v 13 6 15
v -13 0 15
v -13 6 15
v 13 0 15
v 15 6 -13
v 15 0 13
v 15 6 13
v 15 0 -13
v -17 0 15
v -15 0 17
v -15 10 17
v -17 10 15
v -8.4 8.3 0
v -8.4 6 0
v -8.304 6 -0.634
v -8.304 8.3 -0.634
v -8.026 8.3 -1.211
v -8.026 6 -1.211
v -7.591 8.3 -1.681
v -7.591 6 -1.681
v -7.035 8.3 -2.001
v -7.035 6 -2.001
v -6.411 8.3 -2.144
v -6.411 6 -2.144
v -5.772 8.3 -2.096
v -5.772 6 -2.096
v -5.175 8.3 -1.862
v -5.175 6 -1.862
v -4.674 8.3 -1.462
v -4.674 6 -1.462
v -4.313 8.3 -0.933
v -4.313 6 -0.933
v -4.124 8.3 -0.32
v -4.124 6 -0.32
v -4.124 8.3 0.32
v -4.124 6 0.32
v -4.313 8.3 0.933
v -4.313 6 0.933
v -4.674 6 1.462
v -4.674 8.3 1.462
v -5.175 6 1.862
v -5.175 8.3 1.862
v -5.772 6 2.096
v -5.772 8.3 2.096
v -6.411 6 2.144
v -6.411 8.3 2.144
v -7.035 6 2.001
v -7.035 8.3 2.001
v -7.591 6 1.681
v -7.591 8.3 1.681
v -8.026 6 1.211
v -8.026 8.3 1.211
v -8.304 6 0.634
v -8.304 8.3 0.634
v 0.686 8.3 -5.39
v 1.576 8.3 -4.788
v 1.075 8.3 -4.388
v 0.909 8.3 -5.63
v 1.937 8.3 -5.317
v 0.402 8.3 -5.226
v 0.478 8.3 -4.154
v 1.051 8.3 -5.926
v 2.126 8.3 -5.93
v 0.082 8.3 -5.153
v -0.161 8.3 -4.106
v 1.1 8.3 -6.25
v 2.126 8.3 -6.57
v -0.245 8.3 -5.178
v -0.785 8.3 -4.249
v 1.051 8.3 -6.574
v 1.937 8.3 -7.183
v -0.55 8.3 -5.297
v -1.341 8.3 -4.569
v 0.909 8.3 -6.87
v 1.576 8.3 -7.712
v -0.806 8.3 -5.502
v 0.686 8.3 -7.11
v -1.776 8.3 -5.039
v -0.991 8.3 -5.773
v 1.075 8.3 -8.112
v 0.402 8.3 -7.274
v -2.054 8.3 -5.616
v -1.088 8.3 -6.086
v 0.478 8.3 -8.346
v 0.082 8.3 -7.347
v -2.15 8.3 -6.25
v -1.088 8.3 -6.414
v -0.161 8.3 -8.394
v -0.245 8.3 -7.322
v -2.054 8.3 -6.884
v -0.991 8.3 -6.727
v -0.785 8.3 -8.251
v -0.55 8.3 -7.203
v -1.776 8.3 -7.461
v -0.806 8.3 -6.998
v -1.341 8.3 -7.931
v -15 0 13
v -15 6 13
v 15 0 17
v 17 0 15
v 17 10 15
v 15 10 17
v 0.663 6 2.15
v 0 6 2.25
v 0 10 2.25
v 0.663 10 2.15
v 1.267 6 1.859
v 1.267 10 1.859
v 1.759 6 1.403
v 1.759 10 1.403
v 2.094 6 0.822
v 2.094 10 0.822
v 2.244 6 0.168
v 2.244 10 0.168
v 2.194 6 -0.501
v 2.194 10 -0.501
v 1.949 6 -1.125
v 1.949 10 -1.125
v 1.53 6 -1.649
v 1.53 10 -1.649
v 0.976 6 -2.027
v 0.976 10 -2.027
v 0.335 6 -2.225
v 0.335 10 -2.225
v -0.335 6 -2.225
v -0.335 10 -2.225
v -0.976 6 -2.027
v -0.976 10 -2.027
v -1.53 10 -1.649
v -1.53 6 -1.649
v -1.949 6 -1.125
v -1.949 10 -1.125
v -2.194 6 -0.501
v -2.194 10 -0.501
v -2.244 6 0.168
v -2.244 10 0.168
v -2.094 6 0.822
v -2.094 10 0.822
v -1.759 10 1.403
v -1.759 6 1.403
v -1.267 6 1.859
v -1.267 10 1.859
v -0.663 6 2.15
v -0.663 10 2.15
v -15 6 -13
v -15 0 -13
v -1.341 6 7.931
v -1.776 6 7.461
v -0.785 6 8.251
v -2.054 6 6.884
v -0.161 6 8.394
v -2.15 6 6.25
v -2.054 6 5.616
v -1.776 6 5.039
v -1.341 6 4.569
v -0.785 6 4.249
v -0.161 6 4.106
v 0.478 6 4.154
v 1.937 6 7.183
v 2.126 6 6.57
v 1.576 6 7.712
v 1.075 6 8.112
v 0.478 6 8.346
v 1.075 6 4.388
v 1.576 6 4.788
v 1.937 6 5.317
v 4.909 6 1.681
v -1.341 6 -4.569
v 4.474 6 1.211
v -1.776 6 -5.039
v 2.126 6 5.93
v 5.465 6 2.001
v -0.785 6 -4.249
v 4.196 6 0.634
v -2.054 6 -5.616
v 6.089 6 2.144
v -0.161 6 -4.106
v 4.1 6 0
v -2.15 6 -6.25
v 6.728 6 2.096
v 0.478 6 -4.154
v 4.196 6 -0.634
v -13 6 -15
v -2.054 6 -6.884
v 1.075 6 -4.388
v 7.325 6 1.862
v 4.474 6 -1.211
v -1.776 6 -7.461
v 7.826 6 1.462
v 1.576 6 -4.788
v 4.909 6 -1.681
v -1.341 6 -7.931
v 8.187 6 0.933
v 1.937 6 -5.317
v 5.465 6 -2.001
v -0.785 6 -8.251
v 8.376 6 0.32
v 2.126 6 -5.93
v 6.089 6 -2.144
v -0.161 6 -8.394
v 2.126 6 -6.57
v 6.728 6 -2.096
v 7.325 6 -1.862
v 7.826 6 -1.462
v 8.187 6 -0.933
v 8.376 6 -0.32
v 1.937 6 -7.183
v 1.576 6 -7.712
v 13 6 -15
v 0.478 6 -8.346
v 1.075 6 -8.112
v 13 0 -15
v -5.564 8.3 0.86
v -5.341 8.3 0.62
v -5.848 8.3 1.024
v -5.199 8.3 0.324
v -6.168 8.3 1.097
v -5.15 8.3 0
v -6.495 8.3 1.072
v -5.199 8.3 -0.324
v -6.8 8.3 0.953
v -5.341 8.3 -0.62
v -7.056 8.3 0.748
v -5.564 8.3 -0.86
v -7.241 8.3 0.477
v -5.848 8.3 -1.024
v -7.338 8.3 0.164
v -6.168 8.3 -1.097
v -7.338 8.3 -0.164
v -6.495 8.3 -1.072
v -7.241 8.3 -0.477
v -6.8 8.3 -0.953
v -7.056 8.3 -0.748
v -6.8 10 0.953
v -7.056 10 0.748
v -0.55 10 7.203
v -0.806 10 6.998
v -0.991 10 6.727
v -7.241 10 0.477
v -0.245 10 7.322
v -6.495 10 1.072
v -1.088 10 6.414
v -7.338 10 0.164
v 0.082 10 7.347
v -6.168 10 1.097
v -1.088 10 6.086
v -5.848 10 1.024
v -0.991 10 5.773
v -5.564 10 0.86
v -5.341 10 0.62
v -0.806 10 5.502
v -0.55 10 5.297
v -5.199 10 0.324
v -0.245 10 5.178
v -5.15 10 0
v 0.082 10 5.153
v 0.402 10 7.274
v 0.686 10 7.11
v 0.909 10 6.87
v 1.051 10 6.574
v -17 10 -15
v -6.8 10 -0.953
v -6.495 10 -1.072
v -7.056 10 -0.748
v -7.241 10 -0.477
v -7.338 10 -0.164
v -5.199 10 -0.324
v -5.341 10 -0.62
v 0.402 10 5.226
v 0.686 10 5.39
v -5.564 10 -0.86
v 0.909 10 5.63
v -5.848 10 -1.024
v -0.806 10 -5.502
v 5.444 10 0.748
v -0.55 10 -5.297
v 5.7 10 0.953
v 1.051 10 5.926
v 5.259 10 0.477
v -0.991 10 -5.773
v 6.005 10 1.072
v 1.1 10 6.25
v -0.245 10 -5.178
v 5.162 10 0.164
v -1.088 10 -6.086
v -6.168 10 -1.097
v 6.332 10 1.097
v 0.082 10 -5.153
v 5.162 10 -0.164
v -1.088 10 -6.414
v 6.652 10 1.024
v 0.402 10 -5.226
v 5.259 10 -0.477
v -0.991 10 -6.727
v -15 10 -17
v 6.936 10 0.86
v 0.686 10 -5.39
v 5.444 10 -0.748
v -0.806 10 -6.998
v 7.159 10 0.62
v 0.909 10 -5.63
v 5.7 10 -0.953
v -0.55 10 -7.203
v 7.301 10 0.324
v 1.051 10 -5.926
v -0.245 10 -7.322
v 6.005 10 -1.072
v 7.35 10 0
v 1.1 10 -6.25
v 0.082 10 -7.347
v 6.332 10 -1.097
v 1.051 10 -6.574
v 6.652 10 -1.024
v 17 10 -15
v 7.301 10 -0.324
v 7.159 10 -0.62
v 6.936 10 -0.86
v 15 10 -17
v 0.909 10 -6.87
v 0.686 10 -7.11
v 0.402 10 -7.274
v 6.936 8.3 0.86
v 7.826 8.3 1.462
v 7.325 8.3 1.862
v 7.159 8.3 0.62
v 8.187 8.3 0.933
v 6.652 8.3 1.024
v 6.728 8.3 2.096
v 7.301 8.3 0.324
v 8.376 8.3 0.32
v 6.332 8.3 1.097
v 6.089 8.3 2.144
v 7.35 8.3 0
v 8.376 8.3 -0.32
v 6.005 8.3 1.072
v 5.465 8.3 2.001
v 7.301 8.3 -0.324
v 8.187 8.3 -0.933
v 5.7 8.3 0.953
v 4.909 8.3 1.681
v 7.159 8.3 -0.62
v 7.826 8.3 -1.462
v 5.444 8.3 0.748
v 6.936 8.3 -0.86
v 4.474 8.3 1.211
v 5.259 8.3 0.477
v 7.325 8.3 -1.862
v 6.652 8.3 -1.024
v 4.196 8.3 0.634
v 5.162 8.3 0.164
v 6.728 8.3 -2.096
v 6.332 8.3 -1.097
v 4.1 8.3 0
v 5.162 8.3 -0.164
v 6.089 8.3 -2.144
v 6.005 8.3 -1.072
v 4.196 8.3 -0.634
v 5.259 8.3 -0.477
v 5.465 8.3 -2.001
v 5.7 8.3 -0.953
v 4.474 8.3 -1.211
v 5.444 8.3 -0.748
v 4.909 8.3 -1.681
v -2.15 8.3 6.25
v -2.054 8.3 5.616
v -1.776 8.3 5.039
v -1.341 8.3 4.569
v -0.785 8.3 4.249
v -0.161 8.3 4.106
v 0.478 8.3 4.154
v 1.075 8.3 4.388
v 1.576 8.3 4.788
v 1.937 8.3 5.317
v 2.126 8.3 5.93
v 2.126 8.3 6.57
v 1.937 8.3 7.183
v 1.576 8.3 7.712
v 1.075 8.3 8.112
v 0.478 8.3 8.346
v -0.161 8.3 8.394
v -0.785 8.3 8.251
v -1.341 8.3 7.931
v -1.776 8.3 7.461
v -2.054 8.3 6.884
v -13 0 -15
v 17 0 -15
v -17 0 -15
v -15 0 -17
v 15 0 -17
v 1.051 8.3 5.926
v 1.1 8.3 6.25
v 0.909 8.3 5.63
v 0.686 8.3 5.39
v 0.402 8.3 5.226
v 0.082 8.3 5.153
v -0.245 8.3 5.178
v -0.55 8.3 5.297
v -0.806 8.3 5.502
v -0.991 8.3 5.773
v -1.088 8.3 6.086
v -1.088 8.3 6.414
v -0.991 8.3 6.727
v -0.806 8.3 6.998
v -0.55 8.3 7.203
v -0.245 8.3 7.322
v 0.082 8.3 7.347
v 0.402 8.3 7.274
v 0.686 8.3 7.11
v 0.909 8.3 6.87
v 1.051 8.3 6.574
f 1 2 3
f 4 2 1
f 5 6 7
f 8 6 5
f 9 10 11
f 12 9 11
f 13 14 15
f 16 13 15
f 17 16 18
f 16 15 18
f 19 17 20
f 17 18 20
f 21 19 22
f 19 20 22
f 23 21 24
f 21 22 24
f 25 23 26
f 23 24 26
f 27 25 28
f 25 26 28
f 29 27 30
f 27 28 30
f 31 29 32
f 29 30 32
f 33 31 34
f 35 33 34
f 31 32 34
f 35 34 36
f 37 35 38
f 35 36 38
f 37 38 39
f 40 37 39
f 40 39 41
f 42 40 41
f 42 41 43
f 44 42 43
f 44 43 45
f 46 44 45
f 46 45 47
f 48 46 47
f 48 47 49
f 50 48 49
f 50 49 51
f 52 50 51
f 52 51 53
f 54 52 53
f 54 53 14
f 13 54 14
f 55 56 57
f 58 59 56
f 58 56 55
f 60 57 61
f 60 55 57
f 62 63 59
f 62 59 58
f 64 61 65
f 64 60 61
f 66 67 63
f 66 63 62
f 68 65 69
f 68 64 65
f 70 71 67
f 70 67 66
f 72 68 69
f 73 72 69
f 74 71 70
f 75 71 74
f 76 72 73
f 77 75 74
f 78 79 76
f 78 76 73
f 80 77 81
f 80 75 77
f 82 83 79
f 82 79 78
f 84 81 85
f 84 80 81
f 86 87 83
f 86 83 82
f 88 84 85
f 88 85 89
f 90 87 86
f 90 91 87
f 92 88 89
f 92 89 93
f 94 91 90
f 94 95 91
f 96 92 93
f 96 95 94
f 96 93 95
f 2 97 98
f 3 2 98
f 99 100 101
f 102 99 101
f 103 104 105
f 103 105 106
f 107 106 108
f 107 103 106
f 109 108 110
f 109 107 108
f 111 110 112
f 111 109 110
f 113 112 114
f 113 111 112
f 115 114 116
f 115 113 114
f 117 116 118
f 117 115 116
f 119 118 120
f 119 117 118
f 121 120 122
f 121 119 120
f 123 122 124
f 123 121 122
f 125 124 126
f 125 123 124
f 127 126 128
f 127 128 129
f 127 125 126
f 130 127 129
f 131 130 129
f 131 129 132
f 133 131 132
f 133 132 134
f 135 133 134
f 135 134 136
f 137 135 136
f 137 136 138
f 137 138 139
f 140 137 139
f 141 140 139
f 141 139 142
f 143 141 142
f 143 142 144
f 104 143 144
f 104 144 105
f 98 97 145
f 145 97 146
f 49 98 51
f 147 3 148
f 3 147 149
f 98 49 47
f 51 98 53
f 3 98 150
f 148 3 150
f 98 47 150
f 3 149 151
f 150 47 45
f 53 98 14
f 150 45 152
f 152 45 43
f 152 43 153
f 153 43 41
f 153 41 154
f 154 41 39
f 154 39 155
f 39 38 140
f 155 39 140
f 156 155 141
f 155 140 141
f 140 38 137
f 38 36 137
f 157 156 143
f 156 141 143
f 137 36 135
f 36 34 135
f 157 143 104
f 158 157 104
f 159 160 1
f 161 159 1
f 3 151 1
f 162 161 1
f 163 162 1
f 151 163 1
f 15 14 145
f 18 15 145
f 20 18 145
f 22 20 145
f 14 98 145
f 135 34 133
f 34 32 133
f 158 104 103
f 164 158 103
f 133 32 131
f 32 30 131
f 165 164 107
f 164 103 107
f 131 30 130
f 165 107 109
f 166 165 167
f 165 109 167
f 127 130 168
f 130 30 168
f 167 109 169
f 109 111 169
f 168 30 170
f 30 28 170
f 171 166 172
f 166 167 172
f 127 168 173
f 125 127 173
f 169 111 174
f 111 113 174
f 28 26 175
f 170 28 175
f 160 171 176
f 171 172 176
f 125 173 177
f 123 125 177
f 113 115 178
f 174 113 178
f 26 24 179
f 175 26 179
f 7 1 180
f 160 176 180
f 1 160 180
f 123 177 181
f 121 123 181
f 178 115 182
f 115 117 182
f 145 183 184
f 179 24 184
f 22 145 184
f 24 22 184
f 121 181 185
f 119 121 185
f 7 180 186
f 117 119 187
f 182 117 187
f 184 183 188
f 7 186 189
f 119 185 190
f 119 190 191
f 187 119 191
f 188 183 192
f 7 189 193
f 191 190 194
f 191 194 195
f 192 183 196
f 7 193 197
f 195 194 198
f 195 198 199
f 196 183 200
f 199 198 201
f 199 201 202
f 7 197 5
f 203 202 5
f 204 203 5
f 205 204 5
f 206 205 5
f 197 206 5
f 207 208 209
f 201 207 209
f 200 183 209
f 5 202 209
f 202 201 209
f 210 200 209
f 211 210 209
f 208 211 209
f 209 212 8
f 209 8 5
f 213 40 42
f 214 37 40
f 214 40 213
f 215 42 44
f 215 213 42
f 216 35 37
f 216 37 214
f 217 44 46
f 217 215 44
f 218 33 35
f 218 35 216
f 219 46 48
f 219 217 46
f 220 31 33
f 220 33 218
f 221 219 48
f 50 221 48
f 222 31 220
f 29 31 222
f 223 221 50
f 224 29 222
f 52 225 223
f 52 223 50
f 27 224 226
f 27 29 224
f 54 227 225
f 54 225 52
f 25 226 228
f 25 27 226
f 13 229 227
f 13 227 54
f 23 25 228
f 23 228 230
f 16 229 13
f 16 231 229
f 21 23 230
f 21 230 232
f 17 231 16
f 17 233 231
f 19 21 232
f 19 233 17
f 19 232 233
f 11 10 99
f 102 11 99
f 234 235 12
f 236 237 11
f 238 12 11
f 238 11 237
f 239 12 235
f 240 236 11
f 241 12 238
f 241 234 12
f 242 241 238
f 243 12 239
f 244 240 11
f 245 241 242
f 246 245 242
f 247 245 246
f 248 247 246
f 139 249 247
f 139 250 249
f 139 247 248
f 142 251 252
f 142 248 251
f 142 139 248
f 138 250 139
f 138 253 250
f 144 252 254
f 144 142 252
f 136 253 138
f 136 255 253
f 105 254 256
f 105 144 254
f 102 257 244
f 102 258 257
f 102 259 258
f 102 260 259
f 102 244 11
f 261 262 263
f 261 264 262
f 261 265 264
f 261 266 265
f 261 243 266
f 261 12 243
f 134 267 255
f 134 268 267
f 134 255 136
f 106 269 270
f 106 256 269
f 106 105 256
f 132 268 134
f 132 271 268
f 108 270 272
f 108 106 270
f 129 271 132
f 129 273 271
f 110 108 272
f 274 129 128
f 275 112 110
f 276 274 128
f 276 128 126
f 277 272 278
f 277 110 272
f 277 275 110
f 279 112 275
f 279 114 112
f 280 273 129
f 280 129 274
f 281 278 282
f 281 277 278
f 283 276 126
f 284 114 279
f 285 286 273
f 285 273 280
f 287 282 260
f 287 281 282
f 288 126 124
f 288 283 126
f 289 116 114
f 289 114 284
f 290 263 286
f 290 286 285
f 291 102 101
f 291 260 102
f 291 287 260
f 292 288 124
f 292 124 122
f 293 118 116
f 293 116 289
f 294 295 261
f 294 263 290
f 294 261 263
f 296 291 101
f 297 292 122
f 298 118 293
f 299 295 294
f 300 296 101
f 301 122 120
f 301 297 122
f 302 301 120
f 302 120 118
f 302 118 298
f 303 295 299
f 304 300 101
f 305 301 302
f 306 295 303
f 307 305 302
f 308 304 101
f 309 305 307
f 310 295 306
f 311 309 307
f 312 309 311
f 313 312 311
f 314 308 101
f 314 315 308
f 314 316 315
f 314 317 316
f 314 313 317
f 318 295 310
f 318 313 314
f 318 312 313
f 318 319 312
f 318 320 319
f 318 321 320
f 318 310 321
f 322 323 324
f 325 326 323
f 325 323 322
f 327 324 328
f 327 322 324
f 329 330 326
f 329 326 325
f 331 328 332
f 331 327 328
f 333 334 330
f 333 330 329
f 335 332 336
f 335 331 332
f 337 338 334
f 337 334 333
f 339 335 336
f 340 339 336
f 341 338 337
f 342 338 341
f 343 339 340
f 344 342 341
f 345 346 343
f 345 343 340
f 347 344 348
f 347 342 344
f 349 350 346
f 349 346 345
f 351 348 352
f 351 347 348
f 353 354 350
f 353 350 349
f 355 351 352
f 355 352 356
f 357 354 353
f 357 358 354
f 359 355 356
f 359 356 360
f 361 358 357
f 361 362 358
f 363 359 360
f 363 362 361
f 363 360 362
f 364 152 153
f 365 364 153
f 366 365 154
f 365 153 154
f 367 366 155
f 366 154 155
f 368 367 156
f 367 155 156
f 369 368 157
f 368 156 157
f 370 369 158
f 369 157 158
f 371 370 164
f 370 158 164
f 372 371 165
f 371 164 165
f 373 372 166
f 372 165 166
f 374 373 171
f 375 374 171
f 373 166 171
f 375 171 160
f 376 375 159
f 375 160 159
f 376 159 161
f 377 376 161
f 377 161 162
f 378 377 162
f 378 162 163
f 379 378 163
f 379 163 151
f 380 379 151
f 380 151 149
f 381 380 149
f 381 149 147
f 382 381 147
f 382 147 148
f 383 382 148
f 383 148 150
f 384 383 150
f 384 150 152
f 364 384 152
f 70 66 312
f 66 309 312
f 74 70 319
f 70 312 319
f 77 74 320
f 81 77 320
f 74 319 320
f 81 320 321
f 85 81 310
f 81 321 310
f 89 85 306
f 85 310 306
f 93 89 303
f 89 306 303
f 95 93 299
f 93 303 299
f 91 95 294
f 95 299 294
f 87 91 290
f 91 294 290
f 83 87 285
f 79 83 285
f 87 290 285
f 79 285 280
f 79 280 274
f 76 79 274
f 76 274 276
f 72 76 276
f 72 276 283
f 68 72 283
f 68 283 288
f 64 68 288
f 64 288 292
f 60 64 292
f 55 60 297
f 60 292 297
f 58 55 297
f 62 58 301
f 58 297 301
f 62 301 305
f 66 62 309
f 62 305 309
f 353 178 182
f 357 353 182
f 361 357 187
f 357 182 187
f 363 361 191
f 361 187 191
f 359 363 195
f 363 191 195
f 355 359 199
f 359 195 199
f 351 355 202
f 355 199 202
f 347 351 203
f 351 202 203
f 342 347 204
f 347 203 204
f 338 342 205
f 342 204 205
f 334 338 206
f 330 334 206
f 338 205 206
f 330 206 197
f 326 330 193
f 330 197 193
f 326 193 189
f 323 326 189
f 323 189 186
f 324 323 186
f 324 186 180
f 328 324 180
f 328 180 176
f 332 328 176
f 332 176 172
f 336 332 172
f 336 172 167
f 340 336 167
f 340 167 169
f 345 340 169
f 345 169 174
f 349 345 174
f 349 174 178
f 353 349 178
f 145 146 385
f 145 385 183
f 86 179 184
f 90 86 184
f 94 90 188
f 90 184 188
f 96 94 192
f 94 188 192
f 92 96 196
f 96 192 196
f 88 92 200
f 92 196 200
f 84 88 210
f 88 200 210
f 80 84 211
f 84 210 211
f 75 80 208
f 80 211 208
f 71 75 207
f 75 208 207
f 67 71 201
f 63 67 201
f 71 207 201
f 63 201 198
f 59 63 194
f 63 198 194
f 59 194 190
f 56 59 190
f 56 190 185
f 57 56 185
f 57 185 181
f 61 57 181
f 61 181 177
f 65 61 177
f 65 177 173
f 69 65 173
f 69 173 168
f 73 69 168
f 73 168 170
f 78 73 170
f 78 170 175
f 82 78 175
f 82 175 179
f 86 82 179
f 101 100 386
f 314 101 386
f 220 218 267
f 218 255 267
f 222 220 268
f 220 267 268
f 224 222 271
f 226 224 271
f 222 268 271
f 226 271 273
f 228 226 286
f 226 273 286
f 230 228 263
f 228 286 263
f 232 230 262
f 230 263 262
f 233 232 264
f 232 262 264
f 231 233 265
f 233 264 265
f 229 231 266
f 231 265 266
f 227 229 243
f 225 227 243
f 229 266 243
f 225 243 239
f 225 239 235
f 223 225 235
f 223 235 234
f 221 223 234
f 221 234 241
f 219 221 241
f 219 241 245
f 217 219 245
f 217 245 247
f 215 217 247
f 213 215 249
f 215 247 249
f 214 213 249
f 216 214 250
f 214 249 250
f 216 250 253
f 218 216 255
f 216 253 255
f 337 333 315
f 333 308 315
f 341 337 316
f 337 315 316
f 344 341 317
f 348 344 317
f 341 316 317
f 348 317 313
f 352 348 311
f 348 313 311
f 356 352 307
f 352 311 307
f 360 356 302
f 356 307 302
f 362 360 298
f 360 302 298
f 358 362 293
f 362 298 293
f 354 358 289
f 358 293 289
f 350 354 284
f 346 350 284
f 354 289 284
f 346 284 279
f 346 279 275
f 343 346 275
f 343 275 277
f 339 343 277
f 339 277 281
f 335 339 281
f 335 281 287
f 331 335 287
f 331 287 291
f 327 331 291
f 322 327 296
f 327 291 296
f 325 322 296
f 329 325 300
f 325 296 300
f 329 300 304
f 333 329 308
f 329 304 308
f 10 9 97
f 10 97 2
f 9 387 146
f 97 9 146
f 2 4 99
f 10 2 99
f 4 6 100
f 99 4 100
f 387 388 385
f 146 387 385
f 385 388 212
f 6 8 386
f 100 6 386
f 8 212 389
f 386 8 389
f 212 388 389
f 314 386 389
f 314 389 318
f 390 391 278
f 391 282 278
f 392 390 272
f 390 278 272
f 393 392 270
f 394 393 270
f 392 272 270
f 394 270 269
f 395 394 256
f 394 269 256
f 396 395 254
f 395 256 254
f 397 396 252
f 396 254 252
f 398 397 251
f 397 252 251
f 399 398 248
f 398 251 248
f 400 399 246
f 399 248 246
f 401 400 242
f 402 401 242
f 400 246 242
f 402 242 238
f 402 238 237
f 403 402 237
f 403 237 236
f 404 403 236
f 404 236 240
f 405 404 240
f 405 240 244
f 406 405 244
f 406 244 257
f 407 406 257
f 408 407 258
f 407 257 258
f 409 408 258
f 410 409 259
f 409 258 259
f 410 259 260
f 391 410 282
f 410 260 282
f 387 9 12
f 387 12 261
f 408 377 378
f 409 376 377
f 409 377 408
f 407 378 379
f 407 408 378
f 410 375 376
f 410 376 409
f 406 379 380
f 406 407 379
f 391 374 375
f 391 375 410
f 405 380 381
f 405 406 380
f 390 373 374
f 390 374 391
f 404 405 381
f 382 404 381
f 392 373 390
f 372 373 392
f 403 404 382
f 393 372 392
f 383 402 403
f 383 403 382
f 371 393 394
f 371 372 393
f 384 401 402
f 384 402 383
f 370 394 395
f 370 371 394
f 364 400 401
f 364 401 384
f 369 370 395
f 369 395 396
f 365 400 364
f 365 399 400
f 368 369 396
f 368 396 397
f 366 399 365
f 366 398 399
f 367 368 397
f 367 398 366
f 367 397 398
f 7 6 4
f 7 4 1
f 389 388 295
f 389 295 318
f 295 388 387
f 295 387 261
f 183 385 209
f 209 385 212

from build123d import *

# Parameters (mm, degrees)
SKETCH_1_W                   = 34
SKETCH_1_H                   = 34
SKETCH_1_R                   = 2.25
EXTRUDE_1_DEPTH              = 10
SKETCH_1_3_W                 = 30
SKETCH_1_3_H                 = 30
SKETCH_1_3_R                 = 2.25
CUT_EXTRUDE_1_DEPTH          = 6
CHAMFER_1_SIZE               = 2
HOLE_WIZARD_M2_1_D           = 2.2
HOLE_WIZARD_M2_1_CBORE_D     = 4.3
HOLE_WIZARD_M2_1_CBORE_DEPTH = 2.3


with BuildPart() as part:
    # 草图1 → 凸台-拉伸1 (new body)
    with BuildSketch(Plane(origin=(0, 0, 0), x_dir=(1, 0, 0), z_dir=(0, 1, 0))):
        Rectangle(SKETCH_1_W, SKETCH_1_H)
        Circle(SKETCH_1_R, mode=Mode.SUBTRACT)
    extrude(amount=EXTRUDE_1_DEPTH)

    # 草图1<3> → 切除-拉伸1 (cut)
    with BuildSketch(Plane(origin=(0, 0, 0), x_dir=(1, 0, 0), z_dir=(0, 1, 0))):
        Rectangle(SKETCH_1_3_W, SKETCH_1_3_H)
        Circle(SKETCH_1_3_R, mode=Mode.SUBTRACT)
    extrude(amount=CUT_EXTRUDE_1_DEPTH, mode=Mode.SUBTRACT)

    # 倒角1
    chamfer_1_edges = [part.edges().sort_by_distance(p)[0] for p in [
        (-15, 3, -15),
        (15, 3, -15),
        (15, 3, 15),
        (-15, 3, 15),
        (-17, 5, 17),
        (17, 5, 17),
        (17, 5, -17),
        (-17, 5, -17),
    ]]
    chamfer(chamfer_1_edges, length=CHAMFER_1_SIZE)

    # M2 六角圆柱头螺钉的柱形沉头孔1 (through all)
    with Locations(Plane(origin=(0, 6, 0), x_dir=(-1, 0, 0), z_dir=(0, -1, 0))):
        with Locations((0, 6.25), (6.25, 0), (0, -6.25), (-6.25, 0)):
            CounterBoreHole(HOLE_WIZARD_M2_1_D / 2, HOLE_WIZARD_M2_1_CBORE_D / 2, HOLE_WIZARD_M2_1_CBORE_DEPTH)


solid = part.part
